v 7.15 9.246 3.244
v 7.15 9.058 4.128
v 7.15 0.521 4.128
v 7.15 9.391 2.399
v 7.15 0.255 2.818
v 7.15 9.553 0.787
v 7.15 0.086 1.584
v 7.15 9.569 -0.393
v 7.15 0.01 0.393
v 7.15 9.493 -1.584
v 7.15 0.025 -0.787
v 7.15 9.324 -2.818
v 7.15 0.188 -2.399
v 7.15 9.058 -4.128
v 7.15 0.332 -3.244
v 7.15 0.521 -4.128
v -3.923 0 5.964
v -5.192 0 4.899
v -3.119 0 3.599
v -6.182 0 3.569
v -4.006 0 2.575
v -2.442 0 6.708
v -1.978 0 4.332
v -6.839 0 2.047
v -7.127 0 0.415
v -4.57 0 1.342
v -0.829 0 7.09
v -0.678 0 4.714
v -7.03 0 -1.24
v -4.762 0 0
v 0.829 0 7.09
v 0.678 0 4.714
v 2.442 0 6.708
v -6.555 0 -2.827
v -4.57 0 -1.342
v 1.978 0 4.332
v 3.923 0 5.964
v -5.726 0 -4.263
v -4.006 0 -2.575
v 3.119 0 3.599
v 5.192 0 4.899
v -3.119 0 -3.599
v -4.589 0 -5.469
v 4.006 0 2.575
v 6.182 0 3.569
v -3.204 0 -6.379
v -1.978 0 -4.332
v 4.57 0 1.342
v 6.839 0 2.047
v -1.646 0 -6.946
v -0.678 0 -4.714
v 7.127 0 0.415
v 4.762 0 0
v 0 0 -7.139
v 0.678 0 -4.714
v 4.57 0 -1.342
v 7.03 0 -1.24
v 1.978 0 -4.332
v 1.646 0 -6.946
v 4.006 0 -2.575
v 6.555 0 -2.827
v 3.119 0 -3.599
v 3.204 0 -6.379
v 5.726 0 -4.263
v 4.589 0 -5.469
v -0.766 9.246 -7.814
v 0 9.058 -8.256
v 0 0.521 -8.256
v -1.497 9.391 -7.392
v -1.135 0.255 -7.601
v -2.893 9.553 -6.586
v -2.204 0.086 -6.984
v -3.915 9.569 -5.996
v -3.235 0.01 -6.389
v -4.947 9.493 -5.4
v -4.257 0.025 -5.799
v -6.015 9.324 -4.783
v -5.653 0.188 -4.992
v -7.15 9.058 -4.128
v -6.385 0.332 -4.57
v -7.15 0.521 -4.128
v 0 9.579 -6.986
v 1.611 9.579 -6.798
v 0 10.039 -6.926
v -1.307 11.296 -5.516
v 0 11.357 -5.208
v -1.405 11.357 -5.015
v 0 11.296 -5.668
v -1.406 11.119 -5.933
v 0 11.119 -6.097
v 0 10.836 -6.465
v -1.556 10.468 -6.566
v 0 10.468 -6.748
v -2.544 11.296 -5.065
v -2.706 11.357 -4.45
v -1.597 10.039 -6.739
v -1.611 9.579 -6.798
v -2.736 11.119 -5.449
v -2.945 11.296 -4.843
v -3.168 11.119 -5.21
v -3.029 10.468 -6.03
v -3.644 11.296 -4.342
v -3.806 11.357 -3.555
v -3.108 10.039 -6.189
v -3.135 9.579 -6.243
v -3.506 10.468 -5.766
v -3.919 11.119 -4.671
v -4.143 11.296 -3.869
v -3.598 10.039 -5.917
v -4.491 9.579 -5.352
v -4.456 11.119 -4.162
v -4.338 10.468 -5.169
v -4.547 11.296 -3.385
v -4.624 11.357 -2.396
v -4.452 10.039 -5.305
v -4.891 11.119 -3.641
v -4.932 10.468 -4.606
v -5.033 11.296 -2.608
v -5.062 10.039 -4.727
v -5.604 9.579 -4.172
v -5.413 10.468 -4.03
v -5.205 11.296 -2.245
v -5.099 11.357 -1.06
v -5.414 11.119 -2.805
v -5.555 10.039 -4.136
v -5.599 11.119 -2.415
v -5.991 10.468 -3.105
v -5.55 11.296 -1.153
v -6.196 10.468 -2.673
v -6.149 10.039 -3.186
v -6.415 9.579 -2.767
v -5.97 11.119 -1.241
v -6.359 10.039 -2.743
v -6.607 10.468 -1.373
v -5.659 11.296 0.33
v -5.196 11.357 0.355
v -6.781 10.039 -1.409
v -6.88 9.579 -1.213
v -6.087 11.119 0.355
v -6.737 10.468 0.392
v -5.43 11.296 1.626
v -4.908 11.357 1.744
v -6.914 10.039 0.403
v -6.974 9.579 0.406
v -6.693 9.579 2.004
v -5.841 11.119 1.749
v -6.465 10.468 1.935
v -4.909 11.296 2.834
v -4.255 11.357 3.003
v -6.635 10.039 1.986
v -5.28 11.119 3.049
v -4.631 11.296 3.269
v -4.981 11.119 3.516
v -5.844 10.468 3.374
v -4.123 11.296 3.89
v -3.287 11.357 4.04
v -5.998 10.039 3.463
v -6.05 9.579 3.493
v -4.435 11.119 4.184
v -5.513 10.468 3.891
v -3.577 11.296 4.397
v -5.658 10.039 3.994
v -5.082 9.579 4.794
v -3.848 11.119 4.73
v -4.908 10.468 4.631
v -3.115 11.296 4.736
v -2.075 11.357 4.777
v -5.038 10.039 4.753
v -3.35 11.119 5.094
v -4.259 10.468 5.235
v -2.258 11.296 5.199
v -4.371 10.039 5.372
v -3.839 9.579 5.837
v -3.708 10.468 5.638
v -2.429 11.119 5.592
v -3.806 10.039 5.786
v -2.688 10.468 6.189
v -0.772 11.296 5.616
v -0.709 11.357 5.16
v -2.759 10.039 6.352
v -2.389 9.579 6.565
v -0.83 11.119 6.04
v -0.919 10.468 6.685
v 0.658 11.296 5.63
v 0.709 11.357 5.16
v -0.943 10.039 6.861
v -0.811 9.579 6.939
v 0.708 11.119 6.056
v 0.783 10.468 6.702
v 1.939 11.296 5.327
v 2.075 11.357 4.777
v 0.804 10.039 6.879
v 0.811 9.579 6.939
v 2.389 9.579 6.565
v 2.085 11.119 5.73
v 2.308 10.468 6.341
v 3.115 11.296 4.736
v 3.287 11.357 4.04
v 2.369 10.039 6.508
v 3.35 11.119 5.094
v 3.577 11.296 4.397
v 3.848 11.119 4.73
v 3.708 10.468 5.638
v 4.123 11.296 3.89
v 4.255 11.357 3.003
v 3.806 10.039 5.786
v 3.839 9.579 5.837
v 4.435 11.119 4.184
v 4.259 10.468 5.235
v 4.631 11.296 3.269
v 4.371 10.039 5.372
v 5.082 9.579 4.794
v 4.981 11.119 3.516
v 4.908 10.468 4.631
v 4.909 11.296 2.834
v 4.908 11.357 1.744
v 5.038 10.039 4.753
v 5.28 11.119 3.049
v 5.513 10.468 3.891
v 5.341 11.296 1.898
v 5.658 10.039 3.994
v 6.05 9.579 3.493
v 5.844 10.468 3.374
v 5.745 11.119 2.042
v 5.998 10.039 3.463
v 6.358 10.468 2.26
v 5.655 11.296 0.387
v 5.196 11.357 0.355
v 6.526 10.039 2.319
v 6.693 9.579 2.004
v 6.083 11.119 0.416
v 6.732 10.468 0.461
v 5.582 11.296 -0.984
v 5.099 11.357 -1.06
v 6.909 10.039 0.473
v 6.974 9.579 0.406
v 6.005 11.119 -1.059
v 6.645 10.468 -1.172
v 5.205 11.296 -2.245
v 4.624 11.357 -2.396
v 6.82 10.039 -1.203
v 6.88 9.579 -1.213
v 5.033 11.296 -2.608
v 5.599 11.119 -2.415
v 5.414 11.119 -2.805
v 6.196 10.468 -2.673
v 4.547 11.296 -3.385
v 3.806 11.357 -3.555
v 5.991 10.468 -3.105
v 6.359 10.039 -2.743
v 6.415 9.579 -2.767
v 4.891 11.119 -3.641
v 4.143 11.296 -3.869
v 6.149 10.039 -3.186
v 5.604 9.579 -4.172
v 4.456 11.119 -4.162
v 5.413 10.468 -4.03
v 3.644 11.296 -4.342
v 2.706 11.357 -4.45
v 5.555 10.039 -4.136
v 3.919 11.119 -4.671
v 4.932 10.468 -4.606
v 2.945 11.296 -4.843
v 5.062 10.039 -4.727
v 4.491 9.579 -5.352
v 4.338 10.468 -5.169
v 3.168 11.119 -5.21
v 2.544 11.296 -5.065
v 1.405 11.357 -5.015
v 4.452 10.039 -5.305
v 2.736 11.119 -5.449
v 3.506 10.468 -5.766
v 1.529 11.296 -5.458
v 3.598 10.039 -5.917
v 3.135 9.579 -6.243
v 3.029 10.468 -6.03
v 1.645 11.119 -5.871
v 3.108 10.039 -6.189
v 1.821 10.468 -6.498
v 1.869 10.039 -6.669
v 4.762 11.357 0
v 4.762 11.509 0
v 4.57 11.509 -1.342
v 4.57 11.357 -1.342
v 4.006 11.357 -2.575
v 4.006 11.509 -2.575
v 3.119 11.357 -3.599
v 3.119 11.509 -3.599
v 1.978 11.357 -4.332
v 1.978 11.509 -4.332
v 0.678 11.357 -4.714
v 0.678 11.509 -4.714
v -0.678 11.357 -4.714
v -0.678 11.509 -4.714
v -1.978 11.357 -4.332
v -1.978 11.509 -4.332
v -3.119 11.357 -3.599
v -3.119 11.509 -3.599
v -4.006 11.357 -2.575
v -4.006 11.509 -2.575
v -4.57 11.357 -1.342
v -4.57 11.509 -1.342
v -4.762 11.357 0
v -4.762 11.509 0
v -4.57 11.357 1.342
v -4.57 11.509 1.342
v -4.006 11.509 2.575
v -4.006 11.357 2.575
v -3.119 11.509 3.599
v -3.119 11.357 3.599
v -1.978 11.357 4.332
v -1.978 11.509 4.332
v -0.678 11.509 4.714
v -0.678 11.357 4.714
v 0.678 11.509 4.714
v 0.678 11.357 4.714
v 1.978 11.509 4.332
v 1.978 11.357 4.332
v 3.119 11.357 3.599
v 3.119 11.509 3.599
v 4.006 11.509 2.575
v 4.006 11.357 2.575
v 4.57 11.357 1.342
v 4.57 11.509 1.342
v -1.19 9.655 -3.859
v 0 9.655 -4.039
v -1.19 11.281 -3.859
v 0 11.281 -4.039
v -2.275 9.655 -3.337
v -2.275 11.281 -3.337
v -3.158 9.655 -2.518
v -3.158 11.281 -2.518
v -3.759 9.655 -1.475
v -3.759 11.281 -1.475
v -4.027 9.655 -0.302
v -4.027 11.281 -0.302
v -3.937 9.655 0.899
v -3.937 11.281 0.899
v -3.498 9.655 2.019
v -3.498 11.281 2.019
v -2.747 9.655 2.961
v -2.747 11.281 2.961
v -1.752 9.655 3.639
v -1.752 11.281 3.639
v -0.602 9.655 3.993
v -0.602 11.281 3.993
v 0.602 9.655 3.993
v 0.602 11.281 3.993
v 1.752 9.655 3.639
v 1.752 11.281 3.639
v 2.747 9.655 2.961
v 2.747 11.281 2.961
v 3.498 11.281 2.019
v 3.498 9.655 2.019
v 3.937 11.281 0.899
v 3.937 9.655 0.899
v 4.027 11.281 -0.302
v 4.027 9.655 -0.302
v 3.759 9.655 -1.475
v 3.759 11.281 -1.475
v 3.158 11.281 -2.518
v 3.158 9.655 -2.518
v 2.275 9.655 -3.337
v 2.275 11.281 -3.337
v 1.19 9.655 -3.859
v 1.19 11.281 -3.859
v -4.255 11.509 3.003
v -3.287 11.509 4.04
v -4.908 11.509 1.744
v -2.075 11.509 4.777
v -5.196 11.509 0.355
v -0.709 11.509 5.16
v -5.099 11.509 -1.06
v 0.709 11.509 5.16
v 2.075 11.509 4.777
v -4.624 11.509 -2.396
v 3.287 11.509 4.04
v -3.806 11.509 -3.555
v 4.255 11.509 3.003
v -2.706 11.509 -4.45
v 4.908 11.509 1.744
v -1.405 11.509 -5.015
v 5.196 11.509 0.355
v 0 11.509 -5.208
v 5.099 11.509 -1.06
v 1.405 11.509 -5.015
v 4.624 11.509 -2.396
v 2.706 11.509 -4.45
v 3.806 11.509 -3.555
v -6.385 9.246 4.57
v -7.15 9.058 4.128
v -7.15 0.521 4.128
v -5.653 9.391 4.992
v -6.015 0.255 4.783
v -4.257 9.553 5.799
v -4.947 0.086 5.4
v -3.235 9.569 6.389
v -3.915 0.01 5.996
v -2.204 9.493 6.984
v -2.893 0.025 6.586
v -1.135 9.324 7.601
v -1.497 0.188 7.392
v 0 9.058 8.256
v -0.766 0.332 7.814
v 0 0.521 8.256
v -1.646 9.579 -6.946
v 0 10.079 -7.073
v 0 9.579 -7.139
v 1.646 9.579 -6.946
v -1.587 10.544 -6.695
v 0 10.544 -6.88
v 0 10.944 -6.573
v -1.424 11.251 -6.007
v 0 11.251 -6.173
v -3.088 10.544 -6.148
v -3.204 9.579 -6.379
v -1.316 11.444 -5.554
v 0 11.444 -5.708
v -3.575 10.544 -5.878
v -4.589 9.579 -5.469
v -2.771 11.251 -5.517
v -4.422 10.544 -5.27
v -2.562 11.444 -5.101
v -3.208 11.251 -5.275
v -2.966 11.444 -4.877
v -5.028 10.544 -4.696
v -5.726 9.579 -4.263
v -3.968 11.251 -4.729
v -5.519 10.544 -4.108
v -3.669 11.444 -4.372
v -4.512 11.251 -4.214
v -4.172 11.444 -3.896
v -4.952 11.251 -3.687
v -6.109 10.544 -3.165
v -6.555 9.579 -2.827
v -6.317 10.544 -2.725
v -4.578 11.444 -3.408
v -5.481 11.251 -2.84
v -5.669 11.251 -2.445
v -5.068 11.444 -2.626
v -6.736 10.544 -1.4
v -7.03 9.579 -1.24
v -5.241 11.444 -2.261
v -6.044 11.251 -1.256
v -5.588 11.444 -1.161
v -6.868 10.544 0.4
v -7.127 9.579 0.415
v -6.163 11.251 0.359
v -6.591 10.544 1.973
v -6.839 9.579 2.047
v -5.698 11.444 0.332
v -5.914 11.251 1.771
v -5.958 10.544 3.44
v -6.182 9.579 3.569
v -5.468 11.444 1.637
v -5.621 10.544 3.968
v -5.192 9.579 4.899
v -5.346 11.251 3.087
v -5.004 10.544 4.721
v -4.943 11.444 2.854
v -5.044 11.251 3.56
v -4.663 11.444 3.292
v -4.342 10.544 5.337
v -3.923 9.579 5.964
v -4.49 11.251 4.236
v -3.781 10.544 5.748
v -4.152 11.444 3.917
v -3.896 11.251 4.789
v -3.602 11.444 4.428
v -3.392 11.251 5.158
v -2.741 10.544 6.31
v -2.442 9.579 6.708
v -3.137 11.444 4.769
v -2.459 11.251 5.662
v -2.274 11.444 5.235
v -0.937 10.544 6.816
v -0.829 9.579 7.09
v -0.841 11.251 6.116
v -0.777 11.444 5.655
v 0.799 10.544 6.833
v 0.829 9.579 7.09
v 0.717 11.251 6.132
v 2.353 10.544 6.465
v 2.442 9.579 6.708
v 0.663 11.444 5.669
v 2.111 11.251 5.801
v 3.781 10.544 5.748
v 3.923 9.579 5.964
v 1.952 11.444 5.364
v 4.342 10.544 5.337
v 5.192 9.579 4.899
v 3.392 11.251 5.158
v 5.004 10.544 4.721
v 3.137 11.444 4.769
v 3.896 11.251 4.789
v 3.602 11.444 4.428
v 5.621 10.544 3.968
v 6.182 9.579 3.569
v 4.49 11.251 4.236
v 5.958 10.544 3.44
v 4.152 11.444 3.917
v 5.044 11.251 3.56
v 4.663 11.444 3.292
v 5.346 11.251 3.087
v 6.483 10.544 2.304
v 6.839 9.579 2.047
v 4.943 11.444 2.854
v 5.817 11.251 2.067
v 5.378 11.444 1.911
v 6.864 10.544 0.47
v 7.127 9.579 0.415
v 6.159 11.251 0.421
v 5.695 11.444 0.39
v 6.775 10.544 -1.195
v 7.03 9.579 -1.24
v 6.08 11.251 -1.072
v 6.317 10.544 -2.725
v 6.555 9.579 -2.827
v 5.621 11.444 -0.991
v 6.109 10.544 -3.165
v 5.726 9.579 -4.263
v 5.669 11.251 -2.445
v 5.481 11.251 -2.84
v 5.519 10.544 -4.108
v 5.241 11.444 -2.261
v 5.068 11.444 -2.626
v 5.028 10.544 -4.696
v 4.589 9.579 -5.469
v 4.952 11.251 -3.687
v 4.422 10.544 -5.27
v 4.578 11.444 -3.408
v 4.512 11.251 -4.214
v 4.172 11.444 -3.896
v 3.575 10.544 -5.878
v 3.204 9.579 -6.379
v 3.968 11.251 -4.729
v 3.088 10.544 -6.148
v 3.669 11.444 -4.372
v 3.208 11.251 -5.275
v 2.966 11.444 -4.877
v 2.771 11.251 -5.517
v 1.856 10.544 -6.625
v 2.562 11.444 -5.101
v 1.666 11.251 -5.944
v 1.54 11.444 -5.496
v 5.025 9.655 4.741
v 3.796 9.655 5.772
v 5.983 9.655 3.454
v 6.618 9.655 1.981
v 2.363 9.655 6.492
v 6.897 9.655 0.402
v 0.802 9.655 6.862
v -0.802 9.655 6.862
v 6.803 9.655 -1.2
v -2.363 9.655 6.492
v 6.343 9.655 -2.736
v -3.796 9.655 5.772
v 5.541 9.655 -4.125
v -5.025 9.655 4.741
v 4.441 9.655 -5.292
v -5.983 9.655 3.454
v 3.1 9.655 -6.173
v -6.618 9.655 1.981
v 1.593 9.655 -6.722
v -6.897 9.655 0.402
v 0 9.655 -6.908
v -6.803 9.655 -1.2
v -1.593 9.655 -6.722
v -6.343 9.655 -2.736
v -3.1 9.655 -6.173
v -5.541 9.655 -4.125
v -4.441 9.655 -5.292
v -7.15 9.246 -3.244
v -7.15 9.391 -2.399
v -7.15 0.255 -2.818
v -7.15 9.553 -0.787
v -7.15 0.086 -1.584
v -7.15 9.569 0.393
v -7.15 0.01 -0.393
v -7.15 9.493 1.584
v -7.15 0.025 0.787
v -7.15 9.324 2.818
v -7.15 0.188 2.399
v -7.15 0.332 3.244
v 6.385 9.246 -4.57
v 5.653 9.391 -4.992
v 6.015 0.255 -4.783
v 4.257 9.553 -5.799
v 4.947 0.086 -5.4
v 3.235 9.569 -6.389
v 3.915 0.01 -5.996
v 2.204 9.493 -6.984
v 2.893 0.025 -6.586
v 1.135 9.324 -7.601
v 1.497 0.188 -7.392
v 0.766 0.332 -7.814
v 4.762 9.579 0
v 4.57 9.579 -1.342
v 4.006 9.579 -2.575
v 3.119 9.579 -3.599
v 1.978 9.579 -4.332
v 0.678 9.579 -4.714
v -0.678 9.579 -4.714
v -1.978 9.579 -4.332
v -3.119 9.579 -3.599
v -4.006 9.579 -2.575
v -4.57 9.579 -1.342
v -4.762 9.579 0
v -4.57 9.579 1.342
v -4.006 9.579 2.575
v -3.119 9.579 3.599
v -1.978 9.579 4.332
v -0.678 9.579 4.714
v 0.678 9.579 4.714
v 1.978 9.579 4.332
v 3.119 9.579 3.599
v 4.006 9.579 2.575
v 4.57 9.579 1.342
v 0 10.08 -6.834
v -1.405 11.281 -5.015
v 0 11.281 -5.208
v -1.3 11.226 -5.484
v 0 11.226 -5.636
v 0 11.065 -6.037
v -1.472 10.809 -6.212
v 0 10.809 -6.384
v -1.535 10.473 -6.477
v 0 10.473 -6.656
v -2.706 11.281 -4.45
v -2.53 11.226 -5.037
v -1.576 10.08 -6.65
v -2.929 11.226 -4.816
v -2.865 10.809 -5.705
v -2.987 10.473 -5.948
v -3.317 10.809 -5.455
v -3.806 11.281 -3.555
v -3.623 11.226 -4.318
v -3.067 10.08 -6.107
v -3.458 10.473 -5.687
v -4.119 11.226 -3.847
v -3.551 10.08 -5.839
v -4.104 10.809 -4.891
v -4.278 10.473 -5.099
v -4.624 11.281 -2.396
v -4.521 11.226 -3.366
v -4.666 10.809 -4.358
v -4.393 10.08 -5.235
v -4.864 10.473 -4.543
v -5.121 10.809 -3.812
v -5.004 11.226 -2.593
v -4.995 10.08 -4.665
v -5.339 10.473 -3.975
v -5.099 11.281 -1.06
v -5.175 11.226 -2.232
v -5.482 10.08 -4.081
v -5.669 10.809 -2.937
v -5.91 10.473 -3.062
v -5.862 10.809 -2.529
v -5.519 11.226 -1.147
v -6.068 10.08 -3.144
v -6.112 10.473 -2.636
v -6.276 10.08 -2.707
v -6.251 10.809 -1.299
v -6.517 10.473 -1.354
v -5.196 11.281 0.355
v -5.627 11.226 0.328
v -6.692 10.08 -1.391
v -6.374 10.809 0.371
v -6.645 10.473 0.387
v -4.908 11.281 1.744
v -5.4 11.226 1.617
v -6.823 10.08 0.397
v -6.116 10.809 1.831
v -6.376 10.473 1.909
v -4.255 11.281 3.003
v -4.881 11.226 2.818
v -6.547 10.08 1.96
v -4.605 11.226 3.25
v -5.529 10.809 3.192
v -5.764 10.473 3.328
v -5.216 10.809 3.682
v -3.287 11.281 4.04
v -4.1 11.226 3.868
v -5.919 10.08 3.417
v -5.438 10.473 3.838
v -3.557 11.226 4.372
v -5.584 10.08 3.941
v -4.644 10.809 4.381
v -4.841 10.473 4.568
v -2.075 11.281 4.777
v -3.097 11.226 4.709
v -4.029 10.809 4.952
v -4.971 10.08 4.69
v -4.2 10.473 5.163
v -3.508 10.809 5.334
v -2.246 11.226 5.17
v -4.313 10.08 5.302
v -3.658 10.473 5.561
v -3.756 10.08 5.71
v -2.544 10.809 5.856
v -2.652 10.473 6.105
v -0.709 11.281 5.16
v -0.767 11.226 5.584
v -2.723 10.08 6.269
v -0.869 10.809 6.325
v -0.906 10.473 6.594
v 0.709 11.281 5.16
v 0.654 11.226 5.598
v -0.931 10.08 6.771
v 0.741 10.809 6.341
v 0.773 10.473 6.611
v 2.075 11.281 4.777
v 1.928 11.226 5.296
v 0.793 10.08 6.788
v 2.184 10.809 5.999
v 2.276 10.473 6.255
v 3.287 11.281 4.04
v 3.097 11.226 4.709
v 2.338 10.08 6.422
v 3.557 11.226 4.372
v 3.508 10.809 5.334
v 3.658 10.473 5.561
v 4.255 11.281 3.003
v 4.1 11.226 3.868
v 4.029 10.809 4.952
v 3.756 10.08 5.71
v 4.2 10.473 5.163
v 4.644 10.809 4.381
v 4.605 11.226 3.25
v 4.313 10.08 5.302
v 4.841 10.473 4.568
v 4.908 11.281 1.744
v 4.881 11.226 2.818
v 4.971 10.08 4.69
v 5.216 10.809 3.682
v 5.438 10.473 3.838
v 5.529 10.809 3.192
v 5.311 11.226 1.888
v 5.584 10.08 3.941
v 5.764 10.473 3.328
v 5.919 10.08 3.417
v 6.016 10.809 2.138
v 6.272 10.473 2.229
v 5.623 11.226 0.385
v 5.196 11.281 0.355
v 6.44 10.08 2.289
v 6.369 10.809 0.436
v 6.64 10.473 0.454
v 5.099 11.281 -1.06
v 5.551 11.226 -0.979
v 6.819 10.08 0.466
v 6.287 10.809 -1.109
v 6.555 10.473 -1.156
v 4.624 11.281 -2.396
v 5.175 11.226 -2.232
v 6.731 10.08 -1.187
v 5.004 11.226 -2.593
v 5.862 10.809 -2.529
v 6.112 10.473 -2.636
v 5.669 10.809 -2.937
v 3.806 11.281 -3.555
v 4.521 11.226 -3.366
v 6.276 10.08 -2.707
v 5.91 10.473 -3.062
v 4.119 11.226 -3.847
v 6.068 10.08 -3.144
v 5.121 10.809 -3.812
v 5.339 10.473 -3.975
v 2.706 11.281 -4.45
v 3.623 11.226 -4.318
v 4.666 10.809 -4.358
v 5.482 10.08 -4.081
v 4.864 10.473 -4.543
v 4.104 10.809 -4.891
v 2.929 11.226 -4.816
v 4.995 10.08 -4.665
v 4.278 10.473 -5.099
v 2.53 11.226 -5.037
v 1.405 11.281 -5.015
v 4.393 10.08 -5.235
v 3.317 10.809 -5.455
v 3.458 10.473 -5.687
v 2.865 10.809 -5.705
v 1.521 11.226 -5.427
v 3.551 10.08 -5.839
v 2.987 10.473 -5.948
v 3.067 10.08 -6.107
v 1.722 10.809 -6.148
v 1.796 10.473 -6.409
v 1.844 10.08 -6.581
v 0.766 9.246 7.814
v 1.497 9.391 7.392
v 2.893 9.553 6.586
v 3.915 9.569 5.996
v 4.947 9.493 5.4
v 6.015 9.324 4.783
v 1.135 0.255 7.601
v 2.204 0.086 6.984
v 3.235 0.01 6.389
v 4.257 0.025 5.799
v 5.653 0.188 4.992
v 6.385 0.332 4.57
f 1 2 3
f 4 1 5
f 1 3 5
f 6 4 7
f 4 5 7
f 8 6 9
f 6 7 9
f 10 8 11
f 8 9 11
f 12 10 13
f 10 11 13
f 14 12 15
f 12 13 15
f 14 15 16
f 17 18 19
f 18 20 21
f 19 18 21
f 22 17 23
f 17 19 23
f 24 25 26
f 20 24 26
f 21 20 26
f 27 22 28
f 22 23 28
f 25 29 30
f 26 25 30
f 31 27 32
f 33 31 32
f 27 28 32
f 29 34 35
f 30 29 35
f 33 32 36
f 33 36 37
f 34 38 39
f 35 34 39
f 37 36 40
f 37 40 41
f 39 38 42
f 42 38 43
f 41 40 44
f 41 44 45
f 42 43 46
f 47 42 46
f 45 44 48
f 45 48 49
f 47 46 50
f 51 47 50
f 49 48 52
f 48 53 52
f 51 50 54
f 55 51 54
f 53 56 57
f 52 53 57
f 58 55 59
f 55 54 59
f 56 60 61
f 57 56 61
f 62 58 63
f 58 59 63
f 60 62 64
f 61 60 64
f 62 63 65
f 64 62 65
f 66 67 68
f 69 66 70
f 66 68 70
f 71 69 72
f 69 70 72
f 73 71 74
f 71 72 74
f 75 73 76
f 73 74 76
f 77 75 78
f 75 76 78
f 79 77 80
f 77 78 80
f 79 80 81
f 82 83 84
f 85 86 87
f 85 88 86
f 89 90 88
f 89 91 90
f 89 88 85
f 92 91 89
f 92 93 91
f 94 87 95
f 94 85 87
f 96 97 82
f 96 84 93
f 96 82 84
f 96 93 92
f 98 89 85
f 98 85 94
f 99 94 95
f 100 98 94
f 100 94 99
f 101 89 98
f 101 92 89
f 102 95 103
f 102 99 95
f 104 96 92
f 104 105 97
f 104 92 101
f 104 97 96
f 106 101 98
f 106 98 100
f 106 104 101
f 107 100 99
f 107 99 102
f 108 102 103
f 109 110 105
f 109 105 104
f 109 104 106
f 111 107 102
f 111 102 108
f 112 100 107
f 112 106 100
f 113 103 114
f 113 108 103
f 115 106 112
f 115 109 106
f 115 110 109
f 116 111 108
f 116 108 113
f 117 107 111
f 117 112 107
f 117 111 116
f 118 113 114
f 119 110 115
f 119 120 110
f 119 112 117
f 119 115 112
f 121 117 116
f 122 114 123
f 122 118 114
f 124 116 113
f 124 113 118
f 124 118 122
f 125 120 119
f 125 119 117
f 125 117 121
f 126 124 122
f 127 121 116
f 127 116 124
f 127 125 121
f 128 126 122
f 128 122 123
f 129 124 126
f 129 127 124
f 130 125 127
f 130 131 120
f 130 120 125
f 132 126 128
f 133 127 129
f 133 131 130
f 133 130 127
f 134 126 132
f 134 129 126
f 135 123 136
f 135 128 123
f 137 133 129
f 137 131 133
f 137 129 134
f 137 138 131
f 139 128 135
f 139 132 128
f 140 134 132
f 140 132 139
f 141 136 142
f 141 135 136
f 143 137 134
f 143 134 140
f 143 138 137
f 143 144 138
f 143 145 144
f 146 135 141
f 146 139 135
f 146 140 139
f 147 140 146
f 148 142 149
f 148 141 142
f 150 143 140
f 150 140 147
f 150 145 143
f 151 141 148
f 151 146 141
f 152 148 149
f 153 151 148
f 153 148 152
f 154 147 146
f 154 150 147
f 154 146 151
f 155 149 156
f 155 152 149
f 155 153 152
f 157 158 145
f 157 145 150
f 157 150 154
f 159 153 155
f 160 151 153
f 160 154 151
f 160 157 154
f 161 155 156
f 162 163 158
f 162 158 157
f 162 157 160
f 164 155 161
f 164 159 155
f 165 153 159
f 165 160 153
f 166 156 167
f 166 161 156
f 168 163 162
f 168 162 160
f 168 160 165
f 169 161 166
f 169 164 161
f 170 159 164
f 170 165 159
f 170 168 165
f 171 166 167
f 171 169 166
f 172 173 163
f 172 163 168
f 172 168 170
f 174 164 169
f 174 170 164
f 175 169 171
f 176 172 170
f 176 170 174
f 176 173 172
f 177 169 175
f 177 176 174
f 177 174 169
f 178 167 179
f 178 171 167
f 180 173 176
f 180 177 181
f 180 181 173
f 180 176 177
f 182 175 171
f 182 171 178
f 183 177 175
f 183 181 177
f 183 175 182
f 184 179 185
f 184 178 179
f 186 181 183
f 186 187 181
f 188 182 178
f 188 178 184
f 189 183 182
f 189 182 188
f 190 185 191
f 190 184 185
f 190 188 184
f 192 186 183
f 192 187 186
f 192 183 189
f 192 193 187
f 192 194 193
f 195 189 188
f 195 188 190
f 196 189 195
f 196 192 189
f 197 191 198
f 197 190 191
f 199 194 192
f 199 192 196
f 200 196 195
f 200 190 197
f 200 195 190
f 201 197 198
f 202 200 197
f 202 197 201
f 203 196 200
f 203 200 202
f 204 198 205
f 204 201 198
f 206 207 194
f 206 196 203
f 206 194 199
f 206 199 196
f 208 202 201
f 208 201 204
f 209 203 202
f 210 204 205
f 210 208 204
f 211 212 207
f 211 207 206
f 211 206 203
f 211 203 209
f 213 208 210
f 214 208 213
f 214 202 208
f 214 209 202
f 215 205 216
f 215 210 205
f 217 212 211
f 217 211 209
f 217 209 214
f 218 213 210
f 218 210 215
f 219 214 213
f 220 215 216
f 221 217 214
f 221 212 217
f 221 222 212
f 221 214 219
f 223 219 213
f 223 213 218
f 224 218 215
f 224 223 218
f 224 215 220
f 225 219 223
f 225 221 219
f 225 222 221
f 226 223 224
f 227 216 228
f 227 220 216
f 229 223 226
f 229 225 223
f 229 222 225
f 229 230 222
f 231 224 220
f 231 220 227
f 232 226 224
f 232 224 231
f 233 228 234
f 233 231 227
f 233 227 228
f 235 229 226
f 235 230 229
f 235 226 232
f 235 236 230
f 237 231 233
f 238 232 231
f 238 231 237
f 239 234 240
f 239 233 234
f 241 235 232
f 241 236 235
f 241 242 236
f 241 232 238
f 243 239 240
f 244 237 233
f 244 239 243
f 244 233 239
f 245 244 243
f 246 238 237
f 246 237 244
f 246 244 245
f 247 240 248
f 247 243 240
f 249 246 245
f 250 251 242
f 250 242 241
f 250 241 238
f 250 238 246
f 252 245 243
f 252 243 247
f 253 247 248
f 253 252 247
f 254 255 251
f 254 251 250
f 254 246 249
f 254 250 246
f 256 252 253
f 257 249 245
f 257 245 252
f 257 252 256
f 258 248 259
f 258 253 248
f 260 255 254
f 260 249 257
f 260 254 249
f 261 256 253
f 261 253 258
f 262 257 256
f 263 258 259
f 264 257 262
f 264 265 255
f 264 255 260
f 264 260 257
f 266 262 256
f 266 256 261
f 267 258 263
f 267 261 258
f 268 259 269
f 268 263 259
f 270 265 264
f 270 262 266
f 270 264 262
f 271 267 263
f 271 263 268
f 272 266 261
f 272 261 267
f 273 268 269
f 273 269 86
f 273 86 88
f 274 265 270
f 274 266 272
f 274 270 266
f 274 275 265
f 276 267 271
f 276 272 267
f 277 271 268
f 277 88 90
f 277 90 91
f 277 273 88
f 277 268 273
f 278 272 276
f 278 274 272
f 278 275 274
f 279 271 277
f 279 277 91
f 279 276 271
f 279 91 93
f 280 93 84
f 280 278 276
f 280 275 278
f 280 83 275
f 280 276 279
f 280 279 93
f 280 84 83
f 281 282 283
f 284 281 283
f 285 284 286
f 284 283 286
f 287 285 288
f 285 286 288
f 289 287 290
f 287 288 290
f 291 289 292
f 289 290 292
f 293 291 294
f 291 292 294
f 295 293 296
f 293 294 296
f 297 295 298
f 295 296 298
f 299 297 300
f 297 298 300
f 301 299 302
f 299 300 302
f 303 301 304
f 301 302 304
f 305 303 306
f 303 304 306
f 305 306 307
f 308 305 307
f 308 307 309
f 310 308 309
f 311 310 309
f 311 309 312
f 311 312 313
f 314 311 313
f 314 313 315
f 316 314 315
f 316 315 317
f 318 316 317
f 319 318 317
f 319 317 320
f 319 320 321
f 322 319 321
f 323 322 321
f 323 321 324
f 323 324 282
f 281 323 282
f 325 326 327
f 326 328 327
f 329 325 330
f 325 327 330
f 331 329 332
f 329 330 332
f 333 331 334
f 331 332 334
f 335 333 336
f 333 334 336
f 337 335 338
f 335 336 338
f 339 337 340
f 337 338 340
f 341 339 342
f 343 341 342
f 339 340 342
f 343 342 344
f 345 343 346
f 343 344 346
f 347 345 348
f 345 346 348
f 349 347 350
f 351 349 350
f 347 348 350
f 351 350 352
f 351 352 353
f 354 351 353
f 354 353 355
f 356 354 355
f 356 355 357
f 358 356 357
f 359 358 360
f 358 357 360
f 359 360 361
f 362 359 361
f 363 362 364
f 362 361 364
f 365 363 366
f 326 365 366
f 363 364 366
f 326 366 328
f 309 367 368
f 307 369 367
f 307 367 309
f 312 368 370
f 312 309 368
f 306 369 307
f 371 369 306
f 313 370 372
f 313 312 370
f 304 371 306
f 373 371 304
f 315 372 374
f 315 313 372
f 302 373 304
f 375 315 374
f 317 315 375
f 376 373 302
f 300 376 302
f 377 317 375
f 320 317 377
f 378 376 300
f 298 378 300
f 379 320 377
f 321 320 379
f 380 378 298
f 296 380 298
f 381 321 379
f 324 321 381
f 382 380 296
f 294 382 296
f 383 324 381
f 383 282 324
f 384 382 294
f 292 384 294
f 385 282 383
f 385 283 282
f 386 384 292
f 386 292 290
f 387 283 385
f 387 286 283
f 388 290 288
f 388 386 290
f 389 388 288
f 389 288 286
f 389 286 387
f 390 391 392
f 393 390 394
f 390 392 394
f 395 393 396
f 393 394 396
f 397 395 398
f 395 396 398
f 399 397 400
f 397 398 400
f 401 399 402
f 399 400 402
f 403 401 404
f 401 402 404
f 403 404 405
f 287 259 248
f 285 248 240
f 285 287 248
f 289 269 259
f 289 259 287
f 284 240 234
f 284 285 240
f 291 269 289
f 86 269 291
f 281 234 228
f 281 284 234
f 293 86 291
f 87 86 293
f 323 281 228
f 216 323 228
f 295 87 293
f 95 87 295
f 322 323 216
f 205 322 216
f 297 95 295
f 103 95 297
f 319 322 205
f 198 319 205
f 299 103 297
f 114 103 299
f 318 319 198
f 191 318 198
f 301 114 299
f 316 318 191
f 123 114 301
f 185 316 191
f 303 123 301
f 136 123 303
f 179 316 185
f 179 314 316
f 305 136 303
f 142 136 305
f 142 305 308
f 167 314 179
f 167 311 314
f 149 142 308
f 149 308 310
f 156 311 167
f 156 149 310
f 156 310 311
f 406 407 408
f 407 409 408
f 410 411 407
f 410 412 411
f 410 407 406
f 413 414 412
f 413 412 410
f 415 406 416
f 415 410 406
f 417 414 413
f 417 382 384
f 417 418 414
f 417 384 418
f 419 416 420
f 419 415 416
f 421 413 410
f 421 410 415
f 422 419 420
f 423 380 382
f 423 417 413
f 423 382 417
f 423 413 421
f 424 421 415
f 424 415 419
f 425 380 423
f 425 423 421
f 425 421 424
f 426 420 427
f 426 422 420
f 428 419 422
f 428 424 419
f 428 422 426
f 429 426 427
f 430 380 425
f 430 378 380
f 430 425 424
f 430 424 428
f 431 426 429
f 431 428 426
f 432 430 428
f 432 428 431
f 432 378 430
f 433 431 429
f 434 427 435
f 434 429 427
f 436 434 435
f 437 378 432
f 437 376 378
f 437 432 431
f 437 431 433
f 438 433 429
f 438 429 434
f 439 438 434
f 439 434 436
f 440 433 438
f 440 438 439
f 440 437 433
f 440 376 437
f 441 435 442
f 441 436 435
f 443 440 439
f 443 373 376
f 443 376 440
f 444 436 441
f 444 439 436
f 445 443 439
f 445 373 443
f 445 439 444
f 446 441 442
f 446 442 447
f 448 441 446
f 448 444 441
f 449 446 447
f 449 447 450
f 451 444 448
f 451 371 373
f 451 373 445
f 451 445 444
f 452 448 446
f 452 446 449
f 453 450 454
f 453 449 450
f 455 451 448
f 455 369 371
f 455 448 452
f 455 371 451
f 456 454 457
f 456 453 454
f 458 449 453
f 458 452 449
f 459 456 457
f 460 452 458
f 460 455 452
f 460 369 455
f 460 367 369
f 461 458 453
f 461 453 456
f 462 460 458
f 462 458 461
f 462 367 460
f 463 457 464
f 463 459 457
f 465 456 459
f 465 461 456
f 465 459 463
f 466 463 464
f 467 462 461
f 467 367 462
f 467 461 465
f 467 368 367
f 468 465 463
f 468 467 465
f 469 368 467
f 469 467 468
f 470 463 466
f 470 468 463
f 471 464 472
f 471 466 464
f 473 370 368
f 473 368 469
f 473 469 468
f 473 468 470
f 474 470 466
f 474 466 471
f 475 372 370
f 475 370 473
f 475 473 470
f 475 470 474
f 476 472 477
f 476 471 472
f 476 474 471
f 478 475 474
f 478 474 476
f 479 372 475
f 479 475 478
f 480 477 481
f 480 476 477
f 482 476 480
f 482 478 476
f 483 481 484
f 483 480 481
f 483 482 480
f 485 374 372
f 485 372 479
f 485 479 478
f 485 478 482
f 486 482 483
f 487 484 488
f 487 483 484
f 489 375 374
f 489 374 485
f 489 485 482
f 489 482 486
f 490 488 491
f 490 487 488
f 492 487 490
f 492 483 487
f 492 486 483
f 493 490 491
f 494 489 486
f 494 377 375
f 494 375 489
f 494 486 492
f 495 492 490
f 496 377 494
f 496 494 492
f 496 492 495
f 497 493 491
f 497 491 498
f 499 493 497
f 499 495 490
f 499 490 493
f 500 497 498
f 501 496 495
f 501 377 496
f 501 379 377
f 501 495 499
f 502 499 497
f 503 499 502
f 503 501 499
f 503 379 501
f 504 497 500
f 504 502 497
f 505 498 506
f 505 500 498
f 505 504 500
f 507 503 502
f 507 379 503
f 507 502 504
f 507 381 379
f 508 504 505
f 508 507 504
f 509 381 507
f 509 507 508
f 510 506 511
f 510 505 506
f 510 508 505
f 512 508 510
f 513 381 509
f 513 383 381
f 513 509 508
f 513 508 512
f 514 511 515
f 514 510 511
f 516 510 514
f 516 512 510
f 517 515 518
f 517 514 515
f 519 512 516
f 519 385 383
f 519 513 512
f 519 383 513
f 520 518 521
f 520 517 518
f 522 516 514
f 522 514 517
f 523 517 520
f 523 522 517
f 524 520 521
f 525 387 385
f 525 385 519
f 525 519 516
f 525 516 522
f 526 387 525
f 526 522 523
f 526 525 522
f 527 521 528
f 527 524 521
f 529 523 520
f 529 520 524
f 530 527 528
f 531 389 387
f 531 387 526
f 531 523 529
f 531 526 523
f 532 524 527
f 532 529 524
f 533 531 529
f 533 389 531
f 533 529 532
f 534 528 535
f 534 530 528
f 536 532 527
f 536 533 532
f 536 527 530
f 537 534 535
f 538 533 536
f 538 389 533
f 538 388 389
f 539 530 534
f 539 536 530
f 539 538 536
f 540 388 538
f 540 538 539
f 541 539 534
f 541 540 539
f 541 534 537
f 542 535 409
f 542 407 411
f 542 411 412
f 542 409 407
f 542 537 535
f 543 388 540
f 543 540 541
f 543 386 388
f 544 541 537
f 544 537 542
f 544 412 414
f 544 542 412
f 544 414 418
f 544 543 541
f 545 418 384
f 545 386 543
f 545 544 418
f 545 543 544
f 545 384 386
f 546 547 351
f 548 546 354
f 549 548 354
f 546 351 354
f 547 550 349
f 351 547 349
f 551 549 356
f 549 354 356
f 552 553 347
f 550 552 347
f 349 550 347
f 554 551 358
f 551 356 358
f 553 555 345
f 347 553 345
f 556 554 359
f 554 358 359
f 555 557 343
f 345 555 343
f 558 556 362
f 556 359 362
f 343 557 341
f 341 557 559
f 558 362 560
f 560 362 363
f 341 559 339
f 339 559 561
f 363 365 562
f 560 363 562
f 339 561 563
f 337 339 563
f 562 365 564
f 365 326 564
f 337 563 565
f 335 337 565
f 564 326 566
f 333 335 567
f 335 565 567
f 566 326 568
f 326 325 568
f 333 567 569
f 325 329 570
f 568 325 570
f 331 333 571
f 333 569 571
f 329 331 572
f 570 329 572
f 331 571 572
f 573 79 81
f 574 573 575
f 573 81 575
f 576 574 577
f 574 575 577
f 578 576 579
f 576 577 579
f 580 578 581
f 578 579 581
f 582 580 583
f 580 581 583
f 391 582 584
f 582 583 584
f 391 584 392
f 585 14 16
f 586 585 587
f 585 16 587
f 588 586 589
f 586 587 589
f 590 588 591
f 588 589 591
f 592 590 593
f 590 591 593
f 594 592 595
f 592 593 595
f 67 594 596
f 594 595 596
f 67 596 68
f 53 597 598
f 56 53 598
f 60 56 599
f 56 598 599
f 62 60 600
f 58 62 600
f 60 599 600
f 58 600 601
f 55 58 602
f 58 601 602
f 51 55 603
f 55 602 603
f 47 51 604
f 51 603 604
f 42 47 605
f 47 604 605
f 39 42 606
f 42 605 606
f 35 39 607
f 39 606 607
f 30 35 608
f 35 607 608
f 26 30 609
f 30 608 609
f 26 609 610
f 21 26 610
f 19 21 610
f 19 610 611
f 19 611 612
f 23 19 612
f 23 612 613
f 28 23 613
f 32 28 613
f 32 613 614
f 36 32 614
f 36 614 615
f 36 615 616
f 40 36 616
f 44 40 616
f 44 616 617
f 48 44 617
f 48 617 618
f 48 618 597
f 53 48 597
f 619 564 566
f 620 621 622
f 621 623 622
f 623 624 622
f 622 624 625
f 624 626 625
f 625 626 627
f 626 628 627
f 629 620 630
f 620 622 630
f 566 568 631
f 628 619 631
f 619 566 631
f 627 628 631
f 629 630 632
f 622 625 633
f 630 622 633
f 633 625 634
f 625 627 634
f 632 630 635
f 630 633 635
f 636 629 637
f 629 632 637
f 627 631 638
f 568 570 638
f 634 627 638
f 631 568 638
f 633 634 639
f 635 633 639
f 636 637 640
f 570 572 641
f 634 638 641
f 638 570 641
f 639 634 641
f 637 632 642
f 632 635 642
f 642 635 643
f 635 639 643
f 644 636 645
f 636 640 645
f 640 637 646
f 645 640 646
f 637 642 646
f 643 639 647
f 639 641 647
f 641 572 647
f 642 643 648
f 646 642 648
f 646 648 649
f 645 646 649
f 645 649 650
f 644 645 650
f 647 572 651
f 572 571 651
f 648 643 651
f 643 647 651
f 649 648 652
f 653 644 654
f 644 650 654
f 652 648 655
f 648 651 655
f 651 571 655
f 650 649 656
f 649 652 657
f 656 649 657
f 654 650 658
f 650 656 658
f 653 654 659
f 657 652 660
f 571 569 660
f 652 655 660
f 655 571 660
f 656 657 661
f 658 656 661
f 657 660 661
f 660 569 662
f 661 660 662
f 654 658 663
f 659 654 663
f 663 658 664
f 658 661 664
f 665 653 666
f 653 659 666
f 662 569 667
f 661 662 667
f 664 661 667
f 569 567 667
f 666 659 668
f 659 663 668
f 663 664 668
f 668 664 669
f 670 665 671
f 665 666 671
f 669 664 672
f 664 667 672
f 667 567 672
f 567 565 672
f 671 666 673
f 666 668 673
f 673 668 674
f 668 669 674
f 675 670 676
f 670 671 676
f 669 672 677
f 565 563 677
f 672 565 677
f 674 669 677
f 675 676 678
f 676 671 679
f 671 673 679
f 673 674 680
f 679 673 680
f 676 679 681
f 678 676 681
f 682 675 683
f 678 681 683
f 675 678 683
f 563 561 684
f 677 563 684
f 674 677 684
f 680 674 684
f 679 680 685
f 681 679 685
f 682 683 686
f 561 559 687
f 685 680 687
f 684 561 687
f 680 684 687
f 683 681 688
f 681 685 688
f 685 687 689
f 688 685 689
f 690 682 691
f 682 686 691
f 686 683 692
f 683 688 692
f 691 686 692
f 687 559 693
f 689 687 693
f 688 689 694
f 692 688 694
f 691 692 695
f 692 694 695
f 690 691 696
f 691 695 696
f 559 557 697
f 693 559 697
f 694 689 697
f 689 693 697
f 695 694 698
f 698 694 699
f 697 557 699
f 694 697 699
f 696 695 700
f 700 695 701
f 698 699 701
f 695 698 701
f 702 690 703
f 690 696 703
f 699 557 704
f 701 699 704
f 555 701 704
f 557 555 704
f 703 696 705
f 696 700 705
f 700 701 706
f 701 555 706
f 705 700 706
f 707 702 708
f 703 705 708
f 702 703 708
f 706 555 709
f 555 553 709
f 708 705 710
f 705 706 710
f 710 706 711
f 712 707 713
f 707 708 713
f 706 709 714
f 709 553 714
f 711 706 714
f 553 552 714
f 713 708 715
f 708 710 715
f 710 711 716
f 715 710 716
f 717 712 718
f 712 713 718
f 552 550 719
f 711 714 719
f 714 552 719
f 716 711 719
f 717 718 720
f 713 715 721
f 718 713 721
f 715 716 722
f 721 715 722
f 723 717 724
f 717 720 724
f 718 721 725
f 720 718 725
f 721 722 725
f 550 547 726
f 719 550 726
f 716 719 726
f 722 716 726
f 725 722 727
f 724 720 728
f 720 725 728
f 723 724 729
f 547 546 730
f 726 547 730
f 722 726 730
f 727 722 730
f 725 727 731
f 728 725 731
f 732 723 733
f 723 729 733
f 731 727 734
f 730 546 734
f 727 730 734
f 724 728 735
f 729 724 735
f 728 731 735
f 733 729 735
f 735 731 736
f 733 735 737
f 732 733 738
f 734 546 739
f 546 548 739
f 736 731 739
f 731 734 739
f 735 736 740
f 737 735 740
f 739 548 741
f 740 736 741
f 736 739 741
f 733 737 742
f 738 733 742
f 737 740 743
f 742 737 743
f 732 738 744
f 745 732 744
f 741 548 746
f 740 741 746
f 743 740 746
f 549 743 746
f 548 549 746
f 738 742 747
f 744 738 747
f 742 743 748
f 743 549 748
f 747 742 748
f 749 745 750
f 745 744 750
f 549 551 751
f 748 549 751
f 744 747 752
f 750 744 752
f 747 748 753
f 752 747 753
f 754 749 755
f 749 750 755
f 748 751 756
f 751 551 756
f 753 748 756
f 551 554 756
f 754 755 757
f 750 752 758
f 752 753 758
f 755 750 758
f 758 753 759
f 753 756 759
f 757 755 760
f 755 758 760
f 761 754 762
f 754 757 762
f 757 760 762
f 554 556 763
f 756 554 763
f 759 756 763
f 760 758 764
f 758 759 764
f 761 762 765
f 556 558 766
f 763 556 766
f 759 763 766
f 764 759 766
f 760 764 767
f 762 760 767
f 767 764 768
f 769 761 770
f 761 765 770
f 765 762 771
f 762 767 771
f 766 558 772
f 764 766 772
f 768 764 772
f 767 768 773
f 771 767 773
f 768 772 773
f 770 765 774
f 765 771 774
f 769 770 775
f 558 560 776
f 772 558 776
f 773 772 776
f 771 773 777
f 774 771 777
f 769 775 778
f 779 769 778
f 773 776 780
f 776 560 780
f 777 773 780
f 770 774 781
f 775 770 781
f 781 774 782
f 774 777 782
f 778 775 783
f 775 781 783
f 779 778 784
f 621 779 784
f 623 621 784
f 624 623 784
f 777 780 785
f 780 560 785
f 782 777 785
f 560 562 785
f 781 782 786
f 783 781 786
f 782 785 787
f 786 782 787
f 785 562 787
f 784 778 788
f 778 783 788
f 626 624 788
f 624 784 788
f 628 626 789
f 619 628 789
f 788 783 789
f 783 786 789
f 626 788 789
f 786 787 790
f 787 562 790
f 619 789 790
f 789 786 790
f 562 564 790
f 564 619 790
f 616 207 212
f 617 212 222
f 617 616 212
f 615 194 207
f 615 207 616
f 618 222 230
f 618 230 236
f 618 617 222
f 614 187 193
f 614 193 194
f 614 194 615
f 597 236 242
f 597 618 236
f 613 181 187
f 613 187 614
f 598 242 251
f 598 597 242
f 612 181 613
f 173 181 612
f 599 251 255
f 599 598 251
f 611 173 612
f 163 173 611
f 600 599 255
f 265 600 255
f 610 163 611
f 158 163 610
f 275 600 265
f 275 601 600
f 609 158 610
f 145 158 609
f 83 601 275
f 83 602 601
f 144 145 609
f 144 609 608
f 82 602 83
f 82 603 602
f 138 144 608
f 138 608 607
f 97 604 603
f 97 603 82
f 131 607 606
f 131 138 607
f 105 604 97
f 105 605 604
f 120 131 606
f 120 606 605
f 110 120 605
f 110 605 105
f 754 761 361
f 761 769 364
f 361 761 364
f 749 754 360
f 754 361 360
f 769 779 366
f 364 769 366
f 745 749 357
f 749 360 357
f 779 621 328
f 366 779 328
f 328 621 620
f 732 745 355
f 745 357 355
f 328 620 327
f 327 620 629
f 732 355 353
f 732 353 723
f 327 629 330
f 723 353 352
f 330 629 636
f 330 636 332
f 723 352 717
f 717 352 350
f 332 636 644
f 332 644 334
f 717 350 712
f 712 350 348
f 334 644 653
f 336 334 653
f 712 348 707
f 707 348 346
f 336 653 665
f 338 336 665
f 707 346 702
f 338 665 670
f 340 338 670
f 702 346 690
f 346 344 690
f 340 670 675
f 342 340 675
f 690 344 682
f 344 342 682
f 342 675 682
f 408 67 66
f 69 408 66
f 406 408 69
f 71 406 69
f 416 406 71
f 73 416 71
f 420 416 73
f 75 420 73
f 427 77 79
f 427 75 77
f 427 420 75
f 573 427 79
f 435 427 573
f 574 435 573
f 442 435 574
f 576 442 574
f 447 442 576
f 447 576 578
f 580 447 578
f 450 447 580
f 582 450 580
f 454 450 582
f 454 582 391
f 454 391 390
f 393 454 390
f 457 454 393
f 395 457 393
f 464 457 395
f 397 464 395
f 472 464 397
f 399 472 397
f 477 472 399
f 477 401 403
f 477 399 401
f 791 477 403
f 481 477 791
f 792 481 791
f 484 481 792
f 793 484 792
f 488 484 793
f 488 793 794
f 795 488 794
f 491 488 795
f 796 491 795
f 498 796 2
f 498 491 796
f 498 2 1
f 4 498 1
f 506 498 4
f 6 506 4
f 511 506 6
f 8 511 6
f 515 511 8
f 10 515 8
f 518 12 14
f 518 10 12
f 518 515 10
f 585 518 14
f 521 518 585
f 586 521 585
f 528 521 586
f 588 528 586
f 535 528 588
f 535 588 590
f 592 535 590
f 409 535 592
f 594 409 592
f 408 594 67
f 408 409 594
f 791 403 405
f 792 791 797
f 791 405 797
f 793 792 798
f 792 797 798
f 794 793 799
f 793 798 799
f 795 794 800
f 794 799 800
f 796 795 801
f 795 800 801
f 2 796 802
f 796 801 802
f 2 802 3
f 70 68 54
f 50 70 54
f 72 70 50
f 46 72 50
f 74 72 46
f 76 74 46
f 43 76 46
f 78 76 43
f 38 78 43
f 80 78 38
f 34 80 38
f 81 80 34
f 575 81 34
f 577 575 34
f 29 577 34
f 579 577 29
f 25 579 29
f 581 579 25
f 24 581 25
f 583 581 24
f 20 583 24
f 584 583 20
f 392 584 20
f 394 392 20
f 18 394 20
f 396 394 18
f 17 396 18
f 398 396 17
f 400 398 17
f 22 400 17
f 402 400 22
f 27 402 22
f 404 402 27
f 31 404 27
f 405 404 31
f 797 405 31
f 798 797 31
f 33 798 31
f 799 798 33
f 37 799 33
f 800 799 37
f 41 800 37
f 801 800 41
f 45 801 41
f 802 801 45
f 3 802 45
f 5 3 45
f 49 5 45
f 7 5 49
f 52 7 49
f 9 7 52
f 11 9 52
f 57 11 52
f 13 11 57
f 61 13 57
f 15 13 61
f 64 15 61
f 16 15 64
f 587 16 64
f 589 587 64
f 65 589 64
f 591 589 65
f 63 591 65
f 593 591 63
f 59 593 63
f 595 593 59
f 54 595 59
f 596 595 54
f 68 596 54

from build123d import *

# Parameters (mm, degrees)
BOSS_EXTRUDE1_DEPTH = 11.509375
SKETCH2_R           = 4.7625
CUT_EXTRUDE1_DEPTH  = 12.509375


with BuildPart() as part:
    # Sketch1 → Boss-Extrude1 (new body)
    with BuildSketch(Plane(origin=(0, 0, 0), x_dir=(1, 0, 0), z_dir=(0, 1, 0))):
        Polygon((0, 8.256224319), (-7.1501, 4.12811216), (-7.1501, -4.12811216), (0, -8.256224319), (7.1501, -4.12811216), (7.1501, 4.12811216), align=None)
    extrude(amount=BOSS_EXTRUDE1_DEPTH)

    # Sketch2 → Cut-Extrude1 (cut, through all)
    with BuildSketch(Plane(origin=(0, 11.509375, 0), x_dir=(1, 0, 0), z_dir=(0, 1, 0))):
        Circle(SKETCH2_R)
    extrude(amount=-CUT_EXTRUDE1_DEPTH, mode=Mode.SUBTRACT)

    # Sketch4 → Cut-Revolve1 (revolve, cut)
    with BuildSketch(Plane(origin=(0, 0, 0), x_dir=(0, 0, -1), z_dir=(1, 0, 0))):
        with BuildLine():
            Line((0, 0), (7.138624319, 0))
            Line((7.138624319, 0), (8.256224319, 0.521145439))
            Line((8.256224319, 0.521145439), (8.256224319, 9.057829561))
            Line((8.256224319, 9.057829561), (7.138624319, 9.578975))
            ThreePointArc((7.138624319, 9.578975), (6.57322325, 10.94397393), (5.208224319, 11.509375))
            Line((5.208224319, 11.509375), (5.208224319, 12.779375))
            Line((5.208224319, 12.779375), (9.526224319, 12.779375))
            Line((9.526224319, 12.779375), (9.526224319, -1.27))
            Line((9.526224319, -1.27), (0, -1.27))
            Line((0, -1.27), (0, 0))
        make_face()
    revolve(axis=Axis((0, 0, 0), (0, 1, 0)), mode=Mode.SUBTRACT)

    # Sketch5 → Cut-Revolve2 (revolve, cut)
    with BuildSketch(Plane(origin=(0, 0, 0), x_dir=(0, 0, -1), z_dir=(1, 0, 0))):
        with BuildLine():
            Line((6.986224319, 9.578975), (0, 9.578975))
            Line((0, 9.578975), (0, 12.118975))
            Line((0, 12.118975), (4.6228, 12.118975))
            Line((4.6228, 12.118975), (4.6228, 11.356975))
            Line((4.6228, 11.356975), (5.208224319, 11.356975))
            ThreePointArc((5.208224319, 11.356975), (6.465460176, 10.836210857), (6.986224319, 9.578975))
        make_face()
    revolve(axis=Axis((0, 9.578975, 0), (0, 1, 0)), mode=Mode.SUBTRACT)


with BuildPart() as body_2:
    # Sketch6 → Revolve1 (revolve)
    with BuildSketch(Plane(origin=(0, 0, 0), x_dir=(0, 0, -1), z_dir=(1, 0, 0))):
        with BuildLine():
            Line((4.0386, 9.655175), (4.0386, 11.280775))
            Line((4.0386, 11.280775), (5.208224319, 11.280775))
            ThreePointArc((5.208224319, 11.280775), (6.384329349, 10.808975081), (6.908317493, 9.655175))
            Line((6.908317493, 9.655175), (4.0386, 9.655175))
        make_face()
    revolve(axis=Axis((0, 0, 0), (0, 1, 0)))


solid = Compound([part.part, body_2.part])
